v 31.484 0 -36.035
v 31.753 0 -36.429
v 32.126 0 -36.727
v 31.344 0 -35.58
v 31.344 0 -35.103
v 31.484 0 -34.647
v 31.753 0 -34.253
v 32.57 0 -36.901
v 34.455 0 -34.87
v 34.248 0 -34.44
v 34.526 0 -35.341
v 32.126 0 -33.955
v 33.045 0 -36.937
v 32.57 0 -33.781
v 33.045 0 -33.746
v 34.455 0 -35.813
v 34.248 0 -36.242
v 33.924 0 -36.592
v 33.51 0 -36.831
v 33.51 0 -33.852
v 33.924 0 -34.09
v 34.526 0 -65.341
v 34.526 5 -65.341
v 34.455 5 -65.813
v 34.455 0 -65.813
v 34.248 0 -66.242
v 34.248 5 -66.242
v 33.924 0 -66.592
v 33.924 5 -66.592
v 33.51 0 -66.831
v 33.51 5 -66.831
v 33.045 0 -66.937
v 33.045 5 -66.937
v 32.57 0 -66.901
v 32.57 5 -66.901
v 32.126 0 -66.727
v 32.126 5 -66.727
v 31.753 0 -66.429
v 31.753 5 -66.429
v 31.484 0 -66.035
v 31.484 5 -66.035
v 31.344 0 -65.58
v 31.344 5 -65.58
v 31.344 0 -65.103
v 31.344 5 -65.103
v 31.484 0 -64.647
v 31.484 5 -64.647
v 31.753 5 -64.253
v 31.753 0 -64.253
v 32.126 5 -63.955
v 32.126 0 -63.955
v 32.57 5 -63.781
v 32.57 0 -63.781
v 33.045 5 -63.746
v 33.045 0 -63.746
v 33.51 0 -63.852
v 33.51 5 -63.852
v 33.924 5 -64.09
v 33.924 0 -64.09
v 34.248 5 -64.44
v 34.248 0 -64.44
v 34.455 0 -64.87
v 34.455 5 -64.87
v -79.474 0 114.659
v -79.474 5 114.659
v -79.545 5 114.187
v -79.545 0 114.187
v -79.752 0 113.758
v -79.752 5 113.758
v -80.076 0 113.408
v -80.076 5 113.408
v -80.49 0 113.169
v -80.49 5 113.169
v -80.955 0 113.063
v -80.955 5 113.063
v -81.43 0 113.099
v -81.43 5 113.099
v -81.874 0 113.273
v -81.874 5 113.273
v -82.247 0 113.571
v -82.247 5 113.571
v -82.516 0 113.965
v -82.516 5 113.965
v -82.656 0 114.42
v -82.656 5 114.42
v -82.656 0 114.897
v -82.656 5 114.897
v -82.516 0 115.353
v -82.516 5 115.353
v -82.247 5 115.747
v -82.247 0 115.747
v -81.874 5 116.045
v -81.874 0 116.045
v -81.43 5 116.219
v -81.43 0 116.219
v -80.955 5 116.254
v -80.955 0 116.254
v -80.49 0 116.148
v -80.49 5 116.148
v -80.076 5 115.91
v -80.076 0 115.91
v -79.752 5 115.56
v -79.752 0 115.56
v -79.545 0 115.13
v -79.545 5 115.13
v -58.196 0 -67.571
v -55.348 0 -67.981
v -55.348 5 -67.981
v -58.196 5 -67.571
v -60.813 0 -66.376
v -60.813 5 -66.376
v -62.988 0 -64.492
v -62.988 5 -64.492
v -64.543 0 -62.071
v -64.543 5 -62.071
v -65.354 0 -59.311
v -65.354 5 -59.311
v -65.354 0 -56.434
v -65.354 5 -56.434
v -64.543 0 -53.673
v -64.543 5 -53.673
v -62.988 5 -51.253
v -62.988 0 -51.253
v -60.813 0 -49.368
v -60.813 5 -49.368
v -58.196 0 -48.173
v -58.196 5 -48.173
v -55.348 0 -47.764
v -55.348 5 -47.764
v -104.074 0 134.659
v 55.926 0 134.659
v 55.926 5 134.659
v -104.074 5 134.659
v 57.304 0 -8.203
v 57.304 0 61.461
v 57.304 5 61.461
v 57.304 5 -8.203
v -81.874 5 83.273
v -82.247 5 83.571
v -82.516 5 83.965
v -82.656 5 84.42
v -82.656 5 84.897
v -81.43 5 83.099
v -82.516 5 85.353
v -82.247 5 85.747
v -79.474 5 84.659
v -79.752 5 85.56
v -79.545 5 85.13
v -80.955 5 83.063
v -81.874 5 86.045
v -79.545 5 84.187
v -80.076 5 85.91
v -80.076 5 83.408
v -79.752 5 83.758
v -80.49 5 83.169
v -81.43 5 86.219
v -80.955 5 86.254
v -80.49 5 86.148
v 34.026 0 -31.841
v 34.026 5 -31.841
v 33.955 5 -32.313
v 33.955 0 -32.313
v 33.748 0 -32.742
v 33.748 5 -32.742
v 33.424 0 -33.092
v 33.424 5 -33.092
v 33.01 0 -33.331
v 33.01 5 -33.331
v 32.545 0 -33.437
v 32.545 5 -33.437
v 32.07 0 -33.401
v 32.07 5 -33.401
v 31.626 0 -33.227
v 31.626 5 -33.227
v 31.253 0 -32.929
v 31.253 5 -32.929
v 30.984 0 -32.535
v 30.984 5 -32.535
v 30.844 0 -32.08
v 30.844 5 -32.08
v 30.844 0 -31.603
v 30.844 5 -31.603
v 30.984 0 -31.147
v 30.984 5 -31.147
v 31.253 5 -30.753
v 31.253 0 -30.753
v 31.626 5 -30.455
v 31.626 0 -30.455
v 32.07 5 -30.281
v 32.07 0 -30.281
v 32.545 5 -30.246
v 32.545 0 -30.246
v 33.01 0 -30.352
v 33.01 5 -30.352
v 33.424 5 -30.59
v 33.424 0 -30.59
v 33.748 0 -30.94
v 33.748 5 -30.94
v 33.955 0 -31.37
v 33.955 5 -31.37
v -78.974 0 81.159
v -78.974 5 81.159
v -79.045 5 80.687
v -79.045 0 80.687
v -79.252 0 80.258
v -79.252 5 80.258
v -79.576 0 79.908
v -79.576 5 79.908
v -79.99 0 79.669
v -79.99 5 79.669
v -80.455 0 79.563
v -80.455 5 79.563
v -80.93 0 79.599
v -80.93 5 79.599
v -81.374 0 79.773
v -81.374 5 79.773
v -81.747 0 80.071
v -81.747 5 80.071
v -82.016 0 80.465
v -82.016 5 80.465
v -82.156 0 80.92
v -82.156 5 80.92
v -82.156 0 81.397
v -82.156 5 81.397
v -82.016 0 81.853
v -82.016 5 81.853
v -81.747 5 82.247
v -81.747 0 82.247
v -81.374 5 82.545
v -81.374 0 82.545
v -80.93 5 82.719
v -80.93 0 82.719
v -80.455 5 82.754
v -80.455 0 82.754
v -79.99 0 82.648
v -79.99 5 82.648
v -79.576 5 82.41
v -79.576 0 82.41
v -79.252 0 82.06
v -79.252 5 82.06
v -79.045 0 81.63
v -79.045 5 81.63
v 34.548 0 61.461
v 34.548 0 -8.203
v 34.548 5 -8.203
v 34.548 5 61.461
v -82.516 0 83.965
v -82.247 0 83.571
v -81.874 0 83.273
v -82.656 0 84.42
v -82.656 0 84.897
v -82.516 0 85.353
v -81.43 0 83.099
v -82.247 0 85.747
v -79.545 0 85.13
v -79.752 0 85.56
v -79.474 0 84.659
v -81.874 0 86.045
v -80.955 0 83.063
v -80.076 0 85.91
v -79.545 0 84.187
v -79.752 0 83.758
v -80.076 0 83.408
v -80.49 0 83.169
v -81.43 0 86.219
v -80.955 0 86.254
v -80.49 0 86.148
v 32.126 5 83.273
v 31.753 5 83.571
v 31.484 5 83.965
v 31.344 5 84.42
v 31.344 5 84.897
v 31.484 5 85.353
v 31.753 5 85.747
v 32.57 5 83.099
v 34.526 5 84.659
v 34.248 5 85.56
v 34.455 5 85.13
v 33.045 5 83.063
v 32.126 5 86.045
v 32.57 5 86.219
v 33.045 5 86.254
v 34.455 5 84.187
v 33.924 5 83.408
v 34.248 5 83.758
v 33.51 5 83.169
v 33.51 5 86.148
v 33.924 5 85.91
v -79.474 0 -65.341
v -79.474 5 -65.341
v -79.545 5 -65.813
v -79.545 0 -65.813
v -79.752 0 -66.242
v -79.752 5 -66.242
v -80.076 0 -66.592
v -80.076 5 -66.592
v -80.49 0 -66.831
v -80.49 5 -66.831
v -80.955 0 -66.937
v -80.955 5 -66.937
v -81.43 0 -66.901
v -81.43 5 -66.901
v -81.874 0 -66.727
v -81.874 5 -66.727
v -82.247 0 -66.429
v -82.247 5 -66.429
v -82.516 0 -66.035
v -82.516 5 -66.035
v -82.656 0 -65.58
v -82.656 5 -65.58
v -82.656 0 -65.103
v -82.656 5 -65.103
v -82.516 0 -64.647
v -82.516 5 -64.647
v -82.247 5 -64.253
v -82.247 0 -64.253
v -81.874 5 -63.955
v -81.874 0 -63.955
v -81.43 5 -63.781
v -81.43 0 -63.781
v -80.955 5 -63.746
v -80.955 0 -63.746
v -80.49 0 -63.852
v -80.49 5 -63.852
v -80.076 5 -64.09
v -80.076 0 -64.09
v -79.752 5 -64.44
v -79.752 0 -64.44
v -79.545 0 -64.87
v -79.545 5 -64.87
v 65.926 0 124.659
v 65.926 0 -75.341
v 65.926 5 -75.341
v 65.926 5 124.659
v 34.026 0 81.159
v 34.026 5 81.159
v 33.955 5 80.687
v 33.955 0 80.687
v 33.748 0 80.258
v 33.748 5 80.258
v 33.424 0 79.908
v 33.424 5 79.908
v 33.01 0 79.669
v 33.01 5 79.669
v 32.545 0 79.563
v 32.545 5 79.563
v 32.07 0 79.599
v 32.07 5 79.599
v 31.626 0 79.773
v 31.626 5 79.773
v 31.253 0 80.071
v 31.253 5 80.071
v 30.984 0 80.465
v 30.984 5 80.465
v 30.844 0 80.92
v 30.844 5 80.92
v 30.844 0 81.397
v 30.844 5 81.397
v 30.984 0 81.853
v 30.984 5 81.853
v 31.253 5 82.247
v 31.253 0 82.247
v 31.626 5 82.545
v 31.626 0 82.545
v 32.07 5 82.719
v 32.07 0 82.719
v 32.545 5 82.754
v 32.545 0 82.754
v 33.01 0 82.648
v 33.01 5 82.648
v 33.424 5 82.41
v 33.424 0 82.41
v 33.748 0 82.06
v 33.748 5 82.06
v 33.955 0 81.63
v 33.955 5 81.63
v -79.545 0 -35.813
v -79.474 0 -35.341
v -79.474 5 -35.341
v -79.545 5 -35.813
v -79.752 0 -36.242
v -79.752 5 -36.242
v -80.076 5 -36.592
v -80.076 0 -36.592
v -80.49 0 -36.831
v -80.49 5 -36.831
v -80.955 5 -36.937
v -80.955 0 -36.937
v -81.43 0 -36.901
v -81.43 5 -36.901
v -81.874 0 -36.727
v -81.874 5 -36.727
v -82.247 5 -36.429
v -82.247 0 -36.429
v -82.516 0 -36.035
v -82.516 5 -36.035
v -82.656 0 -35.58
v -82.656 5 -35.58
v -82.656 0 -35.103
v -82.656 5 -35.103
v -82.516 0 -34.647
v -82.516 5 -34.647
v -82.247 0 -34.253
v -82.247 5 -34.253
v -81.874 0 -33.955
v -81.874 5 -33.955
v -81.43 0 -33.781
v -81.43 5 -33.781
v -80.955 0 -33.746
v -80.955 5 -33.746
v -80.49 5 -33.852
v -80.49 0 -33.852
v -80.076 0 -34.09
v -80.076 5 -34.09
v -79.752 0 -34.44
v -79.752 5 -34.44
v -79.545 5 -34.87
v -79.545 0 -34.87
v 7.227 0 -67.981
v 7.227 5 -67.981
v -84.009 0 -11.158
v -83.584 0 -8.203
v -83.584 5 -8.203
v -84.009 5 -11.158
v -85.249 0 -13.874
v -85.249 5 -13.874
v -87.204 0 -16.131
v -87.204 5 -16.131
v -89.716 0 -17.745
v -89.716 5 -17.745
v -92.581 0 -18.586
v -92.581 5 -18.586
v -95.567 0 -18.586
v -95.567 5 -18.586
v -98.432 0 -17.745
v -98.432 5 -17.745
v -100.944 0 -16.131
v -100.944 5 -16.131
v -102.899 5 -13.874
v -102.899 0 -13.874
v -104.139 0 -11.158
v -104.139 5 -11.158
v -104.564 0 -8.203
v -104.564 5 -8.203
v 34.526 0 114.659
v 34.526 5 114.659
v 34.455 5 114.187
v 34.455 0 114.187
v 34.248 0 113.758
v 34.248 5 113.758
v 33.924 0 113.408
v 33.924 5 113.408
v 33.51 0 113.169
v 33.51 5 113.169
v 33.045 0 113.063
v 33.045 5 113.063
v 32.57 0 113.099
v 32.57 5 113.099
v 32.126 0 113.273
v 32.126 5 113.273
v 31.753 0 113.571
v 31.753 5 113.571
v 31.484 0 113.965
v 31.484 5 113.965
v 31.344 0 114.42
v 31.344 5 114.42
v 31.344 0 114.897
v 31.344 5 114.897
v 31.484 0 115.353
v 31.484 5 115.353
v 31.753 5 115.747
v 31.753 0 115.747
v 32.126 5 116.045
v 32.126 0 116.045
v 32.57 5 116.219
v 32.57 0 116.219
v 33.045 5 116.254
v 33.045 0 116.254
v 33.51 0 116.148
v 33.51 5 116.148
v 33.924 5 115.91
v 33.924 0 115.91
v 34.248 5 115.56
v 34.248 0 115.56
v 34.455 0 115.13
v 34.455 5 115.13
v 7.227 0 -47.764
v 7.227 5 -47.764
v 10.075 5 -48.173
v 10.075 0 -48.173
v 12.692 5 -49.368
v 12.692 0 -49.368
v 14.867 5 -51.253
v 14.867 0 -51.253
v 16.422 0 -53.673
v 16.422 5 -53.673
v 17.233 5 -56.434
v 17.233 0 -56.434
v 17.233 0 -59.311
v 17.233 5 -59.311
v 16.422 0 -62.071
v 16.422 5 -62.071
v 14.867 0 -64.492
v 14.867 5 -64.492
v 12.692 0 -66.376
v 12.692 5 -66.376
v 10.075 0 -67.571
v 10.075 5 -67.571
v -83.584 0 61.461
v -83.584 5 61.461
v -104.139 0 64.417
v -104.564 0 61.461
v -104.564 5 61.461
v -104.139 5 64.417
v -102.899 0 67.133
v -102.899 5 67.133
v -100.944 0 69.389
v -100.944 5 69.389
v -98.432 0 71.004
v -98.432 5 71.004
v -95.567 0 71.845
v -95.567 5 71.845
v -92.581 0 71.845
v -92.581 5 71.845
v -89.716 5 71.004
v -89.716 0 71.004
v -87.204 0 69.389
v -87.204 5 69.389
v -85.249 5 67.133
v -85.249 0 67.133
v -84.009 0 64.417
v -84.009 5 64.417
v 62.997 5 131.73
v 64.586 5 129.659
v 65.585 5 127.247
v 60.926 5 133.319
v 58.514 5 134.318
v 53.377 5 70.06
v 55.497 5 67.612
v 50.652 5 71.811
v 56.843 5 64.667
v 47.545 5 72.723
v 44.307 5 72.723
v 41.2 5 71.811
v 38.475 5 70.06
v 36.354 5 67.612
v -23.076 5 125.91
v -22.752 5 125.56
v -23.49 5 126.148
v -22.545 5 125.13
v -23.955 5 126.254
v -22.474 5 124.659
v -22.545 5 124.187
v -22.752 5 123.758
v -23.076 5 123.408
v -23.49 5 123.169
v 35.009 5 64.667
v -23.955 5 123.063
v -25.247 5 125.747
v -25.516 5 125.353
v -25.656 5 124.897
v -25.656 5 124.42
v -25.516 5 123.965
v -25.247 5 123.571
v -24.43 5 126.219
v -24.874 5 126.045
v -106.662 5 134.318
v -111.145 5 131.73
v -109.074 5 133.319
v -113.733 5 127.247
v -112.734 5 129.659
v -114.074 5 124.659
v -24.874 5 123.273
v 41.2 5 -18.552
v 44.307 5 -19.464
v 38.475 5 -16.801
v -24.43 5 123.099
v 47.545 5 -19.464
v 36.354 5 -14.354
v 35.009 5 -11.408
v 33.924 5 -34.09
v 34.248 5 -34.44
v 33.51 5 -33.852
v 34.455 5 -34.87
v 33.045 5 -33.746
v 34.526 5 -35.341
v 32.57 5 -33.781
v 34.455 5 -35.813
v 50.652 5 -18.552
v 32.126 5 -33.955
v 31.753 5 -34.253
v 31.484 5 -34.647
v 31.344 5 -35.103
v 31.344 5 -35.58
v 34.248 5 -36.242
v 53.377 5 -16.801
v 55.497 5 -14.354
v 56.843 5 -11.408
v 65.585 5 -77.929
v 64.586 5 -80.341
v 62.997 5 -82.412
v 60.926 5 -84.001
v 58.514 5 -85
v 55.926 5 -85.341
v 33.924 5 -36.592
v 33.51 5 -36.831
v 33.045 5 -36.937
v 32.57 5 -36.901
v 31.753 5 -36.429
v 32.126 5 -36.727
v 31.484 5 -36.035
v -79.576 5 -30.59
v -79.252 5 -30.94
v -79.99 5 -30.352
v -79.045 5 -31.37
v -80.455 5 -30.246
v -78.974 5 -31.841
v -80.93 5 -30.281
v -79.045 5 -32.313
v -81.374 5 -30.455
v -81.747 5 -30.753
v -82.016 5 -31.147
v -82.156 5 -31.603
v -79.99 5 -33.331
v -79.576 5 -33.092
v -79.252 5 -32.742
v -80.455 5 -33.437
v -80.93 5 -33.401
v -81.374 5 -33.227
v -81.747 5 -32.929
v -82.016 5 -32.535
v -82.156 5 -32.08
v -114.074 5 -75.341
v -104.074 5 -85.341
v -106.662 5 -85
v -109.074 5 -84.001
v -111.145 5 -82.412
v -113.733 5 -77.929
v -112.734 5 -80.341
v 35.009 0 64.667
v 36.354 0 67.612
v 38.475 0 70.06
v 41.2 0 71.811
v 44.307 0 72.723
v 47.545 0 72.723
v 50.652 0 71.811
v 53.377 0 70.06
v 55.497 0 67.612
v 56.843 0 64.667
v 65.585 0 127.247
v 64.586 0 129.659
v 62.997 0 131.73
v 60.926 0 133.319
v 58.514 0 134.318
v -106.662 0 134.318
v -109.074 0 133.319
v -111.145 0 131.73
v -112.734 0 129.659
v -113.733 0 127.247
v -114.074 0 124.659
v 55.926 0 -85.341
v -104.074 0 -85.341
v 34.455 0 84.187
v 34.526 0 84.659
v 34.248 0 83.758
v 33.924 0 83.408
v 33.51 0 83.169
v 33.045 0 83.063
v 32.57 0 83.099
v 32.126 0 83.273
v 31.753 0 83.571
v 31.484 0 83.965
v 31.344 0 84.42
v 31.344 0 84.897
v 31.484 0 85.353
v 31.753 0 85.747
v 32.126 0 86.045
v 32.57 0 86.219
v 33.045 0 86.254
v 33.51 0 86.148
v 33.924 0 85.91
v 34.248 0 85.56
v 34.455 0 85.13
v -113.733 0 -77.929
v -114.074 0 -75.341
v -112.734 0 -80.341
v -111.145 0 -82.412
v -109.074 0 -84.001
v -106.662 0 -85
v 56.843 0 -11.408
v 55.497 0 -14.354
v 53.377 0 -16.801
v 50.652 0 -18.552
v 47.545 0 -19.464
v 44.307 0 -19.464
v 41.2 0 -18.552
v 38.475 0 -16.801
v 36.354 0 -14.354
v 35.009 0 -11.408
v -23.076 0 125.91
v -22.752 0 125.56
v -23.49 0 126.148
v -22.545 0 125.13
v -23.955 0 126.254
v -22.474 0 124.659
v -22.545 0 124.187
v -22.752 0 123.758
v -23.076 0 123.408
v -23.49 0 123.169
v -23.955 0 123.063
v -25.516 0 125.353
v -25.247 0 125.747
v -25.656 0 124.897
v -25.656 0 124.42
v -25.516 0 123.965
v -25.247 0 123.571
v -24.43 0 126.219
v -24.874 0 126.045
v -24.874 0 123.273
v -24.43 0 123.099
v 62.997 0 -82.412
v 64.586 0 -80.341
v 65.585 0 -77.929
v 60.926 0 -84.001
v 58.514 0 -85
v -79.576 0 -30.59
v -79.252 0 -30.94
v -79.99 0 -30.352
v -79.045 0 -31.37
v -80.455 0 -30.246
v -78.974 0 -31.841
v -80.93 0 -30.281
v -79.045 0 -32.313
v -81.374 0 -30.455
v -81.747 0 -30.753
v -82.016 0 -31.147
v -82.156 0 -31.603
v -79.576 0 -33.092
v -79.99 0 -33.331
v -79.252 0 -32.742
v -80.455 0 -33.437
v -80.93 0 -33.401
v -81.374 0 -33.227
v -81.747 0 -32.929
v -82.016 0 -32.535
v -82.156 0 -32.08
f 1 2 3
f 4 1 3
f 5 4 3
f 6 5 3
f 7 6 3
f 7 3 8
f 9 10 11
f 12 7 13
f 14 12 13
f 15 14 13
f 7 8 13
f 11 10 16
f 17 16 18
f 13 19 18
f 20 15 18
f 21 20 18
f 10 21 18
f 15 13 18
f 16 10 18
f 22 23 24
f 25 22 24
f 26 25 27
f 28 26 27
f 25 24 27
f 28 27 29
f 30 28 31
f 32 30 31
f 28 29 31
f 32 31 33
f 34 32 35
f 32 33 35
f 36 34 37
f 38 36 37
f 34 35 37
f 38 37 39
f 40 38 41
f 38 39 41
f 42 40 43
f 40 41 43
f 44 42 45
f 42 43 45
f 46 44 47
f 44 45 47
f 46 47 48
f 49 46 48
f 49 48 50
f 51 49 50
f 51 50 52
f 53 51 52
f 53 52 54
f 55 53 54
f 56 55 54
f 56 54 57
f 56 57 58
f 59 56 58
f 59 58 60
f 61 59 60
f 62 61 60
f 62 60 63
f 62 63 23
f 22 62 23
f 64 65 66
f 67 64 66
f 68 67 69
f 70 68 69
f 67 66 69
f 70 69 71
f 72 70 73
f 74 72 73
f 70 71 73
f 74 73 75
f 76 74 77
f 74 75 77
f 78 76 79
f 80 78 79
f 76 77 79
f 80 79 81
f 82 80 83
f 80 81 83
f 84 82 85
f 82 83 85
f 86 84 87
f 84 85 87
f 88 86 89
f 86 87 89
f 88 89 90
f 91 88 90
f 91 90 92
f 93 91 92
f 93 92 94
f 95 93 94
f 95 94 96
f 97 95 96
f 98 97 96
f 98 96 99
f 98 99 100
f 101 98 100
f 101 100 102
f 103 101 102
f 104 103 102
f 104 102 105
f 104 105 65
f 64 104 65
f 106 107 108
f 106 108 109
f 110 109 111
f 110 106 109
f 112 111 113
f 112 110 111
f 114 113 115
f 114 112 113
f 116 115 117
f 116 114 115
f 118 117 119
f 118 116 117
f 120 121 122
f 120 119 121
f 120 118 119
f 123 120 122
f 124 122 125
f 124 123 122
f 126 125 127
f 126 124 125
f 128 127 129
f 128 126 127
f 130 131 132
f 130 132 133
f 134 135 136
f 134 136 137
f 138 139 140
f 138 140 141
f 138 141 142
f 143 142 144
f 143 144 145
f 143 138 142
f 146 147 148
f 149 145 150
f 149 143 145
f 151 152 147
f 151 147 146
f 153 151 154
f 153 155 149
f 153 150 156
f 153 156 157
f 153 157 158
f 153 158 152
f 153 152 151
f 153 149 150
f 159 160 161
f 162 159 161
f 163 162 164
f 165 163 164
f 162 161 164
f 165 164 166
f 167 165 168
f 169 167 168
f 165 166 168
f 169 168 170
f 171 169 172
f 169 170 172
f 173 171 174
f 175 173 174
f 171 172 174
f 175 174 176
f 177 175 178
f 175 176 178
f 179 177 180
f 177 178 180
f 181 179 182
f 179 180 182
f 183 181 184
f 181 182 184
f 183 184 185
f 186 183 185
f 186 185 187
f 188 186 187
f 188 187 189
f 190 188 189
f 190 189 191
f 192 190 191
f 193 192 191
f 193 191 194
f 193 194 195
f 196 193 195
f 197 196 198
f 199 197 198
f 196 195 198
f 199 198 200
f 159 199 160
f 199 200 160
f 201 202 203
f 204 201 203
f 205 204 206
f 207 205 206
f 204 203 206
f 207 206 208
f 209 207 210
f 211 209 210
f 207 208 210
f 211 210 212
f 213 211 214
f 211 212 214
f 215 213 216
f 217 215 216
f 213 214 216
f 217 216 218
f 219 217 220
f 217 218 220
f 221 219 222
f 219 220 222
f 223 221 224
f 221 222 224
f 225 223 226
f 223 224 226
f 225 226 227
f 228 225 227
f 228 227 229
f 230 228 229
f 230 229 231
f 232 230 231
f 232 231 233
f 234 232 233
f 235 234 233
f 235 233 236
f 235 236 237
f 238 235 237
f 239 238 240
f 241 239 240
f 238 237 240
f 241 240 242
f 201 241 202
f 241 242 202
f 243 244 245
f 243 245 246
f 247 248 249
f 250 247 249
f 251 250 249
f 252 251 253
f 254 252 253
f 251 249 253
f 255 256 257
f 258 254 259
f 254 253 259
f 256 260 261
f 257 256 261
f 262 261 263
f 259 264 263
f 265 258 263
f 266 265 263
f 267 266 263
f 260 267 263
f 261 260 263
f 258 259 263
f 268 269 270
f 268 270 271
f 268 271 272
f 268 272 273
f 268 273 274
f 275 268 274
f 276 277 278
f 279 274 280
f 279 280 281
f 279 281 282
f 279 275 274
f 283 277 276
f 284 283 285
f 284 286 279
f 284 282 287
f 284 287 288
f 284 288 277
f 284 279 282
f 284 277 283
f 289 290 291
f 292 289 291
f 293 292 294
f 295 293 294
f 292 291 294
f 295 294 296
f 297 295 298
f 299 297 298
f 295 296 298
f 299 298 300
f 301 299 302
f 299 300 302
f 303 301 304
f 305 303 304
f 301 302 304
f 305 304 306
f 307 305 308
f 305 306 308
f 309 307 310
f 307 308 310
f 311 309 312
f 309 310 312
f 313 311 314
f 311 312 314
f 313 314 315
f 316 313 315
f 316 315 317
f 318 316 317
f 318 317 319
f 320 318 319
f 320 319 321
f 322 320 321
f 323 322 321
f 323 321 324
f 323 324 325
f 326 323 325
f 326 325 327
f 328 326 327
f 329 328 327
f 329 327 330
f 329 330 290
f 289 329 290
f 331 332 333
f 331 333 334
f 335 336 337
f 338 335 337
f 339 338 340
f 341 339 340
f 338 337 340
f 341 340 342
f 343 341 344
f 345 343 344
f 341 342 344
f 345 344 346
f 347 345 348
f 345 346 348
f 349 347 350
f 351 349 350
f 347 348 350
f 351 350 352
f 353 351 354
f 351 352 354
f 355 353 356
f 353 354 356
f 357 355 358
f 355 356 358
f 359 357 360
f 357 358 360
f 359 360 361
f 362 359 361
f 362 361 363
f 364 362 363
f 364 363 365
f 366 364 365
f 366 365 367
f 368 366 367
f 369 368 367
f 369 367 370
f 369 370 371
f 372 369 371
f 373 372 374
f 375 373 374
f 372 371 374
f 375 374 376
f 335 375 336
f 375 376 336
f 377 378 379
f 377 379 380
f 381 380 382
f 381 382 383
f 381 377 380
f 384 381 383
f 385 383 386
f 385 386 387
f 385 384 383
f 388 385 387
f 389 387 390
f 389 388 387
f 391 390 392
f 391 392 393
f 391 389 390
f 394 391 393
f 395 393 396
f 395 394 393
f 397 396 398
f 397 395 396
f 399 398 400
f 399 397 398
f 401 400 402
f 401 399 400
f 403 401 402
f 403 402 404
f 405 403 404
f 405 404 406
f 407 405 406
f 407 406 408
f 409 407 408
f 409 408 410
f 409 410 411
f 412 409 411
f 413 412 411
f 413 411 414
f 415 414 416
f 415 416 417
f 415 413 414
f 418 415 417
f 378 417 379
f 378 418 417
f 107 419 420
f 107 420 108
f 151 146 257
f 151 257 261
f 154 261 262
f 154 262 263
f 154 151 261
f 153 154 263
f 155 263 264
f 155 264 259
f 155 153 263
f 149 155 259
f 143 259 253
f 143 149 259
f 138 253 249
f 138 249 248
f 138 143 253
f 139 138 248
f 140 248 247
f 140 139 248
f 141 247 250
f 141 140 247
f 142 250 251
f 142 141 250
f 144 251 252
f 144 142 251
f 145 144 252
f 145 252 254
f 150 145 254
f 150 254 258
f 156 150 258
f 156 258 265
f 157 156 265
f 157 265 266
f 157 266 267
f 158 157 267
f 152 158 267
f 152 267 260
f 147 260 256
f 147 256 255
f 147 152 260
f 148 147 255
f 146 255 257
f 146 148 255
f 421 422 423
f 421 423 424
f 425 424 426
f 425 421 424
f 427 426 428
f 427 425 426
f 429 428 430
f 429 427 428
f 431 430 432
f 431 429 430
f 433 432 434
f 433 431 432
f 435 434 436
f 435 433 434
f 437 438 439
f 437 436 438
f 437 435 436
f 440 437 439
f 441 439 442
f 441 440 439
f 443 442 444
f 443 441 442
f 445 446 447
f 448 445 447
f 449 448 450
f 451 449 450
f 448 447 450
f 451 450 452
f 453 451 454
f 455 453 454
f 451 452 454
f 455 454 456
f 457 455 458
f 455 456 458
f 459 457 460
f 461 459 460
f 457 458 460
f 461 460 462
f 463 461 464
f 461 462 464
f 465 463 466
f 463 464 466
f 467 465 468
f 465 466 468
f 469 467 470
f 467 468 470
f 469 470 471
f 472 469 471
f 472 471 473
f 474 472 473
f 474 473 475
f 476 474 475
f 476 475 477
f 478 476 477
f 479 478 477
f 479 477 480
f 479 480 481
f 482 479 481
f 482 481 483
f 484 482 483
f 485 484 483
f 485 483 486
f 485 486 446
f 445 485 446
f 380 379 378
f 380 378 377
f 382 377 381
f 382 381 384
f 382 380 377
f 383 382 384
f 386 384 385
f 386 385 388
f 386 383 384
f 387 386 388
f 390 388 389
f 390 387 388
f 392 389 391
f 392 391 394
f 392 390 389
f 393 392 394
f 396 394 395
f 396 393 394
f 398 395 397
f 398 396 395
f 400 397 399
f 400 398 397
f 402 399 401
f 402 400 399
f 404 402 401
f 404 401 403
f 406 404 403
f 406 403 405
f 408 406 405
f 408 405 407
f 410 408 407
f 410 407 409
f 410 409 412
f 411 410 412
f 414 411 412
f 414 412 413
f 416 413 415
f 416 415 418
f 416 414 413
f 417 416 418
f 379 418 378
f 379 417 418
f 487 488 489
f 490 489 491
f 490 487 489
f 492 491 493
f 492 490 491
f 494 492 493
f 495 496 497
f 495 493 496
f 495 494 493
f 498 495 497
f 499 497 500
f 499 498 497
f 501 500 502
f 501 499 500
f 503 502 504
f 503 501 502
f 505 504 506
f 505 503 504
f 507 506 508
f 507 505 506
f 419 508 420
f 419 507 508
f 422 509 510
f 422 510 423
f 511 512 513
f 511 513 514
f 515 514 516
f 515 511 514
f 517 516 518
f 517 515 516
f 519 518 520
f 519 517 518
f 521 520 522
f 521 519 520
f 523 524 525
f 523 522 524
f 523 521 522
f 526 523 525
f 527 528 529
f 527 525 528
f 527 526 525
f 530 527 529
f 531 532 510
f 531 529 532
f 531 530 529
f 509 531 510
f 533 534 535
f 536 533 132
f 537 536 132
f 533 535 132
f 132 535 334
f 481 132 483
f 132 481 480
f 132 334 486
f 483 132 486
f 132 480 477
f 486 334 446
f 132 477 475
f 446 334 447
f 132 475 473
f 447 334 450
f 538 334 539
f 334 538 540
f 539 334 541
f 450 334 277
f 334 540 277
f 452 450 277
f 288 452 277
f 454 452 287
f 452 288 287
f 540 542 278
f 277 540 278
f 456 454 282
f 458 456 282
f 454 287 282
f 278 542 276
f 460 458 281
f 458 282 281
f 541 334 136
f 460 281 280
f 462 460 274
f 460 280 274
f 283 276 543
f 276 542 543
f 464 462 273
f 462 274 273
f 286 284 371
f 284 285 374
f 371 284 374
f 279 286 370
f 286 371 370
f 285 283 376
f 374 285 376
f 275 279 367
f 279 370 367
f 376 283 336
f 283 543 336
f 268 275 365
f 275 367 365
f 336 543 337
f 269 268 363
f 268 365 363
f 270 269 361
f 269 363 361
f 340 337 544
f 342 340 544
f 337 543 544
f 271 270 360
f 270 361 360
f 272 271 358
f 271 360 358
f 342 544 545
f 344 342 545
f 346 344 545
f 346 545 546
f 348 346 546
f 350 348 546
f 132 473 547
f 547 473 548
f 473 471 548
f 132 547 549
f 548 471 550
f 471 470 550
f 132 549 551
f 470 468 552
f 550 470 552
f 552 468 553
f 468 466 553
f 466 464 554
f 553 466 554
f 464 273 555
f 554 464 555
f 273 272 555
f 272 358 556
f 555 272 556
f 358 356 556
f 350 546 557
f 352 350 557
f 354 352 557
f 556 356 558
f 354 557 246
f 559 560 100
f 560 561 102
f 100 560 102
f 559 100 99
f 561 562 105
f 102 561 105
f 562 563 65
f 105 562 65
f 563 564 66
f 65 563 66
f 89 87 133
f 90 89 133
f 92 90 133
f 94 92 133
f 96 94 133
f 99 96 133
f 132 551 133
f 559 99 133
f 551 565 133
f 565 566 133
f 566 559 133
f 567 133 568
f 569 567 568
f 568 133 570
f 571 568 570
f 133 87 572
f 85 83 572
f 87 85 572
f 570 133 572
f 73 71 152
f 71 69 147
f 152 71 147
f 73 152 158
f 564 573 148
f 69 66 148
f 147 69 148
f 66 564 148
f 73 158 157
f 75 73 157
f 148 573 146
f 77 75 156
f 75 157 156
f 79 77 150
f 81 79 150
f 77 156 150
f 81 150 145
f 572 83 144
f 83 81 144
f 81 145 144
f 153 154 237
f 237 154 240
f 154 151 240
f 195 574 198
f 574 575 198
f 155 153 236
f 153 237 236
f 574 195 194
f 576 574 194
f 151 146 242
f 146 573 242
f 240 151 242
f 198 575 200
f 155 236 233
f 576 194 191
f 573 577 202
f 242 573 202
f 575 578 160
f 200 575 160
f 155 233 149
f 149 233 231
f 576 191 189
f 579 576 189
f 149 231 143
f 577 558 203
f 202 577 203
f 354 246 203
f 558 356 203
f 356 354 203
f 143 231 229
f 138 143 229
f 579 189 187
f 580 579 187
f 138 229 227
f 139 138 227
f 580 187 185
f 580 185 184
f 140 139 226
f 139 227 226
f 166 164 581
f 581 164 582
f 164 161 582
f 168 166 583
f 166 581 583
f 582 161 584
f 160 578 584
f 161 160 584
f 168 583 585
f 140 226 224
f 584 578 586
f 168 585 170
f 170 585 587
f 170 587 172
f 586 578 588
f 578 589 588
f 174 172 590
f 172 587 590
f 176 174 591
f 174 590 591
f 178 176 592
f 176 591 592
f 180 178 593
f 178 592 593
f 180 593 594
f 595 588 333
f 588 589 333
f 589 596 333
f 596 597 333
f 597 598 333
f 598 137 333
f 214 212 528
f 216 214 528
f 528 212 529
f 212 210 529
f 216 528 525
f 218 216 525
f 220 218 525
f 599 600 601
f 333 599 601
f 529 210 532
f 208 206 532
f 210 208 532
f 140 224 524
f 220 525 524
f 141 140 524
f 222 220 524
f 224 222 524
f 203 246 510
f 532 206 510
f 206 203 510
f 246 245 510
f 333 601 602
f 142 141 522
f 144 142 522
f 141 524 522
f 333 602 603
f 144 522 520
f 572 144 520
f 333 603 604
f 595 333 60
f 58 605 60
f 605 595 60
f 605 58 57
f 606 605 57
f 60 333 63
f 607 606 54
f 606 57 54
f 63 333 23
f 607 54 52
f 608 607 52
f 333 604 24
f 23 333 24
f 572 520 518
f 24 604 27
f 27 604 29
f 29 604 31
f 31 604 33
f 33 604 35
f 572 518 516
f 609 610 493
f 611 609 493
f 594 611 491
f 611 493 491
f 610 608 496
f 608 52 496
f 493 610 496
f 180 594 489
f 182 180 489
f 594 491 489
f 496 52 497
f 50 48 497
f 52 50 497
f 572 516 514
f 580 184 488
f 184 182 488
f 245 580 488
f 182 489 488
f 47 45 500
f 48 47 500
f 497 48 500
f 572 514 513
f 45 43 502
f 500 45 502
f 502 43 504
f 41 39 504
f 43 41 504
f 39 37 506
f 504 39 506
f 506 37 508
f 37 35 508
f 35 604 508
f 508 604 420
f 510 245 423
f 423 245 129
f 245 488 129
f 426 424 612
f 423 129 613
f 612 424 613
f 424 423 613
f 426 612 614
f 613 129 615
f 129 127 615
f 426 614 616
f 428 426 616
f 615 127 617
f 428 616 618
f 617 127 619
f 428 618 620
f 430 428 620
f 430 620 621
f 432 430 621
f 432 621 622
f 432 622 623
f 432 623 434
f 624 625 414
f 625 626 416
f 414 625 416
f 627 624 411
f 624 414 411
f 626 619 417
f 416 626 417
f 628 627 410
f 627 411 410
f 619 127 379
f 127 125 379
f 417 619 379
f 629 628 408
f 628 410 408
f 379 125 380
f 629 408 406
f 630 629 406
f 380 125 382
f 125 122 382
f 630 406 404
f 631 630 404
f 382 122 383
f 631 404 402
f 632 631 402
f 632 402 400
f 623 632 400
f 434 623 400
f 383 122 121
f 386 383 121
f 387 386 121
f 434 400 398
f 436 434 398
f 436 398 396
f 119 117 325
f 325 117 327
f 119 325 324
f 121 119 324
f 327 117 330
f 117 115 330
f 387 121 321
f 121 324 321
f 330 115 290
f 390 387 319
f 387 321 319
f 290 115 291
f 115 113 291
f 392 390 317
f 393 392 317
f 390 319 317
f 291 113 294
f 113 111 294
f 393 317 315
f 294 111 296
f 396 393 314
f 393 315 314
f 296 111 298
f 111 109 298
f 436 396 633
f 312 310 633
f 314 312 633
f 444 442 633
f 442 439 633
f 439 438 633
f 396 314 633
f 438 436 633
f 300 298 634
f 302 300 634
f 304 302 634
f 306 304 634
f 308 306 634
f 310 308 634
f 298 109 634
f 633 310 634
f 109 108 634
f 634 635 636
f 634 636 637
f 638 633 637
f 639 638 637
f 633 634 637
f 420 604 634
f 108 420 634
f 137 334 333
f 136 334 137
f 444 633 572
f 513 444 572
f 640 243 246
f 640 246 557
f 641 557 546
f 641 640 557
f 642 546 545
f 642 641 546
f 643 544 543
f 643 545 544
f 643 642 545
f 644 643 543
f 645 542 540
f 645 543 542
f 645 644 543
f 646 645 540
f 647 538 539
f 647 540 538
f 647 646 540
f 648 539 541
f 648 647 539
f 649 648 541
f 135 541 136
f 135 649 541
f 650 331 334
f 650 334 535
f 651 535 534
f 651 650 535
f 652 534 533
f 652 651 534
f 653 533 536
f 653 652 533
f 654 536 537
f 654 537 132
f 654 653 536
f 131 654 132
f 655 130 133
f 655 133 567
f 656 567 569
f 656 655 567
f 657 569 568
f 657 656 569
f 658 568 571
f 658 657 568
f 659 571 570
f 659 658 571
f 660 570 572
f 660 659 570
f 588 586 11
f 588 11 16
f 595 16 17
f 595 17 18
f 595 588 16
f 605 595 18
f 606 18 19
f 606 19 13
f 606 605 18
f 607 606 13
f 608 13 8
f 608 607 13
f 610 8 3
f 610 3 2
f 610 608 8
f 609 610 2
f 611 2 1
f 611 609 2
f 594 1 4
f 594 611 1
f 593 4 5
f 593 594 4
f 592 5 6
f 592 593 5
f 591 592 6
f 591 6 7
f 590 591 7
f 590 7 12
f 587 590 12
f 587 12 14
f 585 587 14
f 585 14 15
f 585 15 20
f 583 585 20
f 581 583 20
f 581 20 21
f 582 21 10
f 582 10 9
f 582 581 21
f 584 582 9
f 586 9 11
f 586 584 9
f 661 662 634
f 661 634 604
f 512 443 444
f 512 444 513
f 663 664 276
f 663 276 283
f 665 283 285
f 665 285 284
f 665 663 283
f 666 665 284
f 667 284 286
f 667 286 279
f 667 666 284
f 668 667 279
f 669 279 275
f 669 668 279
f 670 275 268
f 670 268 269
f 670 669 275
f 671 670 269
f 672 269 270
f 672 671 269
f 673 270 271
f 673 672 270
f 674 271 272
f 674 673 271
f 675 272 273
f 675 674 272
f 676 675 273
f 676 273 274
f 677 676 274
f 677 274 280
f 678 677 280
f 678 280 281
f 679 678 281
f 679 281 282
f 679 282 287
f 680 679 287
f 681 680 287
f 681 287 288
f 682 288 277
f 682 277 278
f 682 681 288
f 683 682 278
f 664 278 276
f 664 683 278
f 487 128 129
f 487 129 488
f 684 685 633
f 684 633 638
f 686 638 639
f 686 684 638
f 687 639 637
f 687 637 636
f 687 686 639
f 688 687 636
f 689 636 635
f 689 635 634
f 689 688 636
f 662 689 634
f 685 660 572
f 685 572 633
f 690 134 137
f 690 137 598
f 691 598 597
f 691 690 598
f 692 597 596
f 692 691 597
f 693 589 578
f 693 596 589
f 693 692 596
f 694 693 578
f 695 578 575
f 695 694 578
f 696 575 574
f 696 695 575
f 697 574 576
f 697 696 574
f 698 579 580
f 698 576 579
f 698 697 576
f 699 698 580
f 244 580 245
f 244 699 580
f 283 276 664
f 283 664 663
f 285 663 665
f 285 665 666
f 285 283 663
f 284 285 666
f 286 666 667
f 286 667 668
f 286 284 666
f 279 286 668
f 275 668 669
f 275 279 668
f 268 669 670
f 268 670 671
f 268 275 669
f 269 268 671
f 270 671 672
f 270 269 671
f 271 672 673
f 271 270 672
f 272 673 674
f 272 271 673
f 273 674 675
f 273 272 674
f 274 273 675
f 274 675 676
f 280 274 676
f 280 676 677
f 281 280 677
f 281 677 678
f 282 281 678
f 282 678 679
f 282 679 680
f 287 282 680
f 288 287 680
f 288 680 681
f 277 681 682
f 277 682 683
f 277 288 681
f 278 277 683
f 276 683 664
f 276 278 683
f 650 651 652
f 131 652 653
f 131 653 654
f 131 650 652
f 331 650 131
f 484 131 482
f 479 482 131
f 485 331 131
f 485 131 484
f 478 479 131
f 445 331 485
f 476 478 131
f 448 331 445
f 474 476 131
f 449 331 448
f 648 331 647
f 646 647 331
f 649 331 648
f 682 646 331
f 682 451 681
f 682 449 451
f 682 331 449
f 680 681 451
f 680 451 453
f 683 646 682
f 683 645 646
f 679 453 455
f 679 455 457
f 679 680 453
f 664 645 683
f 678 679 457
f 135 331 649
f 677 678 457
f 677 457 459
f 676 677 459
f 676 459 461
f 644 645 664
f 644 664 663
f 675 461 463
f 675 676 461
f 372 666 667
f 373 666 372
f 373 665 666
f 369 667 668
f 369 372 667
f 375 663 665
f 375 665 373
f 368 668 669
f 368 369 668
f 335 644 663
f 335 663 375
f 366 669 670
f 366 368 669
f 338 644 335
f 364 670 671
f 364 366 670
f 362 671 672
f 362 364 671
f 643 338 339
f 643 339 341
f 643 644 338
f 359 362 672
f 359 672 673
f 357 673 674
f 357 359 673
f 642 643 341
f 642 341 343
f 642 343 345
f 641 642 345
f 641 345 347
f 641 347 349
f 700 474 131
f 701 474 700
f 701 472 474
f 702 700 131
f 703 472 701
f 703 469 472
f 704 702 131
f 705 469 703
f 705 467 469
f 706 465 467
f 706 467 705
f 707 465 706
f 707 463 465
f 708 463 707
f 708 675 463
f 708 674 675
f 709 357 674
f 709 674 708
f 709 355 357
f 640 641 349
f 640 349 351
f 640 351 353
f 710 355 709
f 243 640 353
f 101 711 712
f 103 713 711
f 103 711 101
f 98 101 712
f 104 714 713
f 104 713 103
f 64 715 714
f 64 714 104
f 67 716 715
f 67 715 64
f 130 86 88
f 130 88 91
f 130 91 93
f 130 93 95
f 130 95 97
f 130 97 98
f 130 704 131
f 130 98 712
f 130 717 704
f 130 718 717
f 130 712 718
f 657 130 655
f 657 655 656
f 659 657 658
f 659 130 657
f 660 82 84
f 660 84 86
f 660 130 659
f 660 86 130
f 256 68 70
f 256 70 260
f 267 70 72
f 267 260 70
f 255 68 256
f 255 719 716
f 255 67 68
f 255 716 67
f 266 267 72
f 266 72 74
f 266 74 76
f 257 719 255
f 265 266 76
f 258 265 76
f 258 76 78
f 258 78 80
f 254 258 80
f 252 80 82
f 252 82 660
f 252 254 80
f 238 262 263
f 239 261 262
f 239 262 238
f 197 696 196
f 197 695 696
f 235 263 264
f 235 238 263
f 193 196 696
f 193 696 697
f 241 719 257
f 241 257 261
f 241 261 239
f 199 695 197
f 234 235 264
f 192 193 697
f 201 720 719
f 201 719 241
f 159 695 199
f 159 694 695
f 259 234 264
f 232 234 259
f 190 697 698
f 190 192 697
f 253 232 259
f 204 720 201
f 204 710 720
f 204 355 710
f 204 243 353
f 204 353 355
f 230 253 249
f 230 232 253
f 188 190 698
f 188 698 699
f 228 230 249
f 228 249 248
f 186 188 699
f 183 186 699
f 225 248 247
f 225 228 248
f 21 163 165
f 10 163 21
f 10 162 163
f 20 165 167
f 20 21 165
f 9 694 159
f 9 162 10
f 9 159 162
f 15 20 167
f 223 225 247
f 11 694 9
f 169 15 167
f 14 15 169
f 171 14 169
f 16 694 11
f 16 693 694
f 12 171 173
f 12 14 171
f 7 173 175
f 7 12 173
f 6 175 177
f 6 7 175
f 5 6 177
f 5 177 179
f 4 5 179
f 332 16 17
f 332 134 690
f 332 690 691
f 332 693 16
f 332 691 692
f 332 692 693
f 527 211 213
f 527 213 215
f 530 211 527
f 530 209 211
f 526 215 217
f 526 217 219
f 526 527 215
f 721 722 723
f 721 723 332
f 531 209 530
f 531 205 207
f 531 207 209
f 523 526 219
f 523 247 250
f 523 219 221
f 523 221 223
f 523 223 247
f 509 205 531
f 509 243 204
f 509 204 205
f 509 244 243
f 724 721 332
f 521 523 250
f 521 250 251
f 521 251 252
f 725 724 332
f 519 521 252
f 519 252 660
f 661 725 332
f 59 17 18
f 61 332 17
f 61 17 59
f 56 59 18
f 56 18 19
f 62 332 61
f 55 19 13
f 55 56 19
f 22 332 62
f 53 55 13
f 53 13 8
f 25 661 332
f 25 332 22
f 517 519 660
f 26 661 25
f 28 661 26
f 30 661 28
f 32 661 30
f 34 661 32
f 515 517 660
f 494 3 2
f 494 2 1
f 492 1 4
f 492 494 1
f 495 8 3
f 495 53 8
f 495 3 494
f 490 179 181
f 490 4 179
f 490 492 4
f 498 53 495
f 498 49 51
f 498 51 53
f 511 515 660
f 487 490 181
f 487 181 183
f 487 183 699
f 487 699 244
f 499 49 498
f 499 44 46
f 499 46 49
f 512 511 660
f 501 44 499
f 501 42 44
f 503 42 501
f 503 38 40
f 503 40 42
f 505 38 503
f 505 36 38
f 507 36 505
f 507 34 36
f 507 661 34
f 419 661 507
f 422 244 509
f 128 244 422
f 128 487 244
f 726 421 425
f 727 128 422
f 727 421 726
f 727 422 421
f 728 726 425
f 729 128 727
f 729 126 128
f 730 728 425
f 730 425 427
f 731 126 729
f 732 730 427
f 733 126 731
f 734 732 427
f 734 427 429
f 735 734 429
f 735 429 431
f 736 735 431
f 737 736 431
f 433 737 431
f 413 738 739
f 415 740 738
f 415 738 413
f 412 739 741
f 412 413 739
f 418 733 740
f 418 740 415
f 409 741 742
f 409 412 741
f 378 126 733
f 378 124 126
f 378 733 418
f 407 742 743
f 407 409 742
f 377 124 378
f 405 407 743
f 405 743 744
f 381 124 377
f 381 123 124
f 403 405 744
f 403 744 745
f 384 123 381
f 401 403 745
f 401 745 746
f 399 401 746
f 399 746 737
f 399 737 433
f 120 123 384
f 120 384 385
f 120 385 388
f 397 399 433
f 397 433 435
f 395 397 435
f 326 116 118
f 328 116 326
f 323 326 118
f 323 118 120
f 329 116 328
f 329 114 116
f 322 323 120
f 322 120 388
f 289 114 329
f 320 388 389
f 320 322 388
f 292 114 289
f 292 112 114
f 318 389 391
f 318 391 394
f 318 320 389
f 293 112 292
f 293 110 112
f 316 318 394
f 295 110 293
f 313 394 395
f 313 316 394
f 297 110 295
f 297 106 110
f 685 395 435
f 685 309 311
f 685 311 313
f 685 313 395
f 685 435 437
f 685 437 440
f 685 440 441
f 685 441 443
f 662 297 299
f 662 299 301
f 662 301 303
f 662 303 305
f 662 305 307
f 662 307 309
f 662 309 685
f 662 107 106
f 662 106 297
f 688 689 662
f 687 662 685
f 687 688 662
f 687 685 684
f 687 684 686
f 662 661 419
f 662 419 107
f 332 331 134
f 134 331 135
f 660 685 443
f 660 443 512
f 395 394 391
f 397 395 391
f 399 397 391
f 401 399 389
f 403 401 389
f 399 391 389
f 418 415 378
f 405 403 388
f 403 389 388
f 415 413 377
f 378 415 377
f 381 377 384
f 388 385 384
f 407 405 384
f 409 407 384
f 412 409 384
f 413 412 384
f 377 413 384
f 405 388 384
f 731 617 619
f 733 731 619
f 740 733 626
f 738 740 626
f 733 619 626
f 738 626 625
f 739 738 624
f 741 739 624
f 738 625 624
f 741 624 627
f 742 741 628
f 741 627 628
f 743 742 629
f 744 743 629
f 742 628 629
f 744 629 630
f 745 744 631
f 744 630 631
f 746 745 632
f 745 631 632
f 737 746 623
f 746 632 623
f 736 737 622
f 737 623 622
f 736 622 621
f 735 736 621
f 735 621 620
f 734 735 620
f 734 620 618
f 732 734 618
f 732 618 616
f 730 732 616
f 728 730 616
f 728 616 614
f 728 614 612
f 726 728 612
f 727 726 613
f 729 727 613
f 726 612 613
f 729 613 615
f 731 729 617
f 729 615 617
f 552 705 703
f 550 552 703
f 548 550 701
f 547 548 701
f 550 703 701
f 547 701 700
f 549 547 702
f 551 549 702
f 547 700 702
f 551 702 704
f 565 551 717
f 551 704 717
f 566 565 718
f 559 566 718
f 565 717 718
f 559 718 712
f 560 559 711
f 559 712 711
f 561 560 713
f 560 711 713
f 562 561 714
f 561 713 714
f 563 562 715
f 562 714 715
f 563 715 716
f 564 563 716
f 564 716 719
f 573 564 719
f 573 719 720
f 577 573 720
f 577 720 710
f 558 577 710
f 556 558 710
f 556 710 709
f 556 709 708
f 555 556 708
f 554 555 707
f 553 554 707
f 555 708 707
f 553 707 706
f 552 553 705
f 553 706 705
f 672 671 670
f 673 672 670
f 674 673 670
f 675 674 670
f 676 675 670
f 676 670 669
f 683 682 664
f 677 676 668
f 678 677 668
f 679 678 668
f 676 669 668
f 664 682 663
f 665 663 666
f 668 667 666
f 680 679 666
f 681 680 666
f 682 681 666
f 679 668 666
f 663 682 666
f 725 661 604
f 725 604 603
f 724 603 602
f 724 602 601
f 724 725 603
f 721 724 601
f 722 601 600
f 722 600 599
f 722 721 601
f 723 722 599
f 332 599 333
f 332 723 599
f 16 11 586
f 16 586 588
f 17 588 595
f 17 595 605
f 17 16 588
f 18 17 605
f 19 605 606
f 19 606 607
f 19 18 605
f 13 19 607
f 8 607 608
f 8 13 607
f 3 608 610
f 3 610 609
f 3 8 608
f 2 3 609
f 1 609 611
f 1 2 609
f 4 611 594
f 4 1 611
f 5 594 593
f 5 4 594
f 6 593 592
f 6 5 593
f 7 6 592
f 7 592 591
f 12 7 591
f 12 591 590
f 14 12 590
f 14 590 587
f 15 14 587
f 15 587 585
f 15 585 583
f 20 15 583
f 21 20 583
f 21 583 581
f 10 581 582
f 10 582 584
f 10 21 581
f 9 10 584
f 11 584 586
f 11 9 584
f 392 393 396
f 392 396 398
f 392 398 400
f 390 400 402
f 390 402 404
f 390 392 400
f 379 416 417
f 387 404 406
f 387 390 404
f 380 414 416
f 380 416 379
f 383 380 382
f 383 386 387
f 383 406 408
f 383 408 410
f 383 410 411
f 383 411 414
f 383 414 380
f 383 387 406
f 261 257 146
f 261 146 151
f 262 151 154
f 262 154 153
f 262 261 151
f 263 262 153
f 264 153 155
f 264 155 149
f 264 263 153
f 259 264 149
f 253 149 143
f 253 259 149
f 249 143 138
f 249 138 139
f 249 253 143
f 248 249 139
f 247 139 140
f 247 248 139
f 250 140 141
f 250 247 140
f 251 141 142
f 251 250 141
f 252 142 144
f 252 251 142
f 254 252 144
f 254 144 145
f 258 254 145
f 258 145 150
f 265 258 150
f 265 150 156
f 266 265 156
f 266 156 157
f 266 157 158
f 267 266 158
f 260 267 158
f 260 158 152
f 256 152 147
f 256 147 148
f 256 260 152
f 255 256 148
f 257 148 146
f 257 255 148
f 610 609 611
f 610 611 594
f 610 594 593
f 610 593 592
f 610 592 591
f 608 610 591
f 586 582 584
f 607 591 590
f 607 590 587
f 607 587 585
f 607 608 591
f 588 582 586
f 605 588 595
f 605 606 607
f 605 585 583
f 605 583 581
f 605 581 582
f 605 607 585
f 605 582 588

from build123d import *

# Parameters (mm, degrees)
SKETCH_1_R          = 1.6
EXTRUDE_1_DEPTH     = 5
SKETCH_4_R          = 1.6
CUT_EXTRUDE_2_DEPTH = 10
SKETCH_5_R          = 1.6
EXTRUDE_3_DEPTH     = 5
EXTRUDE_3_2_DEPTH   = 5
EXTRUDE_3_3_DEPTH   = 5
EXTRUDE_3_4_DEPTH   = 5
SKETCH_6_R          = 1.6
CUT_EXTRUDE_3_DEPTH = 5
SKETCH_8_R          = 1.6
CUT_EXTRUDE_4_DEPTH = 5
CUT_EXTRUDE_5_DEPTH = 10


with BuildPart() as part:
    # 草图1 → 凸台-拉伸1 (new body)
    with BuildSketch(Plane(origin=(0, 0, 0), x_dir=(1, 0, 0), z_dir=(0, 1, 0))):
        with BuildLine():
            Line((-104.074074074, 85.341130604), (55.925925926, 85.341130604))
            ThreePointArc((55.925925926, 85.341130604), (62.996993738, 82.412198416), (65.925925926, 75.341130604))
            Line((65.925925926, 75.341130604), (65.925925926, -124.658869396))
            ThreePointArc((65.925925926, -124.658869396), (62.996993738, -131.729937208), (55.925925926, -134.658869396))
            Line((55.925925926, -134.658869396), (-104.074074074, -134.658869396))
            ThreePointArc((-104.074074074, -134.658869396), (-111.145141886, -131.729937208), (-114.074074074, -124.658869396))
            Line((-114.074074074, -124.658869396), (-114.074074074, 75.341130604))
            ThreePointArc((-114.074074074, 75.341130604), (-111.145141886, 82.412198416), (-104.074074074, 85.341130604))
        make_face()
        with Locations((-81.074074074, 35.341130604)):
            Circle(SKETCH_1_R, mode=Mode.SUBTRACT)
        with Locations((32.925925926, 35.341130604)):
            Circle(SKETCH_1_R, mode=Mode.SUBTRACT)
        with Locations((32.925925926, -84.658869396)):
            Circle(SKETCH_1_R, mode=Mode.SUBTRACT)
        with Locations((-81.074074074, -84.658869396)):
            Circle(SKETCH_1_R, mode=Mode.SUBTRACT)
    extrude(amount=EXTRUDE_1_DEPTH)

    # 草图4 → 切除-拉伸2 (cut)
    with BuildSketch(Plane(origin=(0, 5, 0), x_dir=(1, 0, 0), z_dir=(0, 1, 0))):
        with Locations((-81.074074074, 65.341130604)):
            Circle(SKETCH_4_R)
        with Locations((32.925925926, 65.341130604)):
            Circle(SKETCH_4_R)
        with Locations((-81.074074074, -114.658869396)):
            Circle(SKETCH_4_R)
        with Locations((32.925925926, -114.658869396)):
            Circle(SKETCH_4_R)
    extrude(amount=-CUT_EXTRUDE_2_DEPTH, mode=Mode.SUBTRACT)

    # 草图6 → 切除-拉伸3 (cut)
    with BuildSketch(Plane(origin=(0, 5, 0), x_dir=(1, 0, 0), z_dir=(0, 1, 0))):
        with Locations((-80.574074074, -81.158869396)):
            Circle(SKETCH_6_R)
        with Locations((-80.574074074, 31.841130604)):
            Circle(SKETCH_6_R)
        with Locations((32.425925926, 31.841130604)):
            Circle(SKETCH_6_R)
        with Locations((32.425925926, -81.158869396)):
            Circle(SKETCH_6_R)
    extrude(amount=-CUT_EXTRUDE_3_DEPTH, mode=Mode.SUBTRACT)

    # 草图8 → 切除-拉伸4 (cut)
    with BuildSketch(Plane.XZ):
        with Locations((-24.074074074, 124.658869396)):
            Circle(SKETCH_8_R)
    extrude(amount=-CUT_EXTRUDE_4_DEPTH, mode=Mode.SUBTRACT)

    # 草图9 → 切除-拉伸5 (cut)
    with BuildSketch(Plane.XZ):
        with BuildLine():
            Line((-83.583774313, 61.461195306), (-83.583774313, -8.202630081))
            ThreePointArc((-83.583774313, -8.202630081), (-94.074074074, -18.692929841), (-104.564373835, -8.202630081))
            Line((-104.564373835, -8.202630081), (-104.564373835, 61.461195306))
            ThreePointArc((-104.564373835, 61.461195306), (-94.074074074, 71.951495067), (-83.583774313, 61.461195306))
        make_face()
        with BuildLine():
            Line((57.303514341, 61.461195306), (57.303514341, -8.202630081))
            ThreePointArc((57.303514341, -8.202630081), (45.925925926, -19.580218496), (34.54833751, -8.202630081))
            Line((34.54833751, -8.202630081), (34.54833751, 61.461195306))
            ThreePointArc((34.54833751, 61.461195306), (45.925925926, 72.838783721), (57.303514341, 61.461195306))
        make_face()
        with BuildLine():
            Line((-55.348114705, -47.763685582), (7.227090262, -47.763685582))
            ThreePointArc((7.227090262, -47.763685582), (17.335582771, -57.87217809), (7.227090262, -67.980670599))
            Line((7.227090262, -67.980670599), (-55.348114705, -67.980670599))
            ThreePointArc((-55.348114705, -67.980670599), (-65.456607213, -57.87217809), (-55.348114705, -47.763685582))
        make_face()
    extrude(amount=-CUT_EXTRUDE_5_DEPTH, mode=Mode.SUBTRACT)


with BuildPart() as body_2:
    # 草图5 → 凸台-拉伸3 (new body)
    with BuildSketch(Plane(origin=(0, 5, 0), x_dir=(1, 0, 0), z_dir=(0, 1, 0))):
        with Locations((-81.074074074, 35.341130604)):
            Circle(SKETCH_5_R)
    extrude(amount=-EXTRUDE_3_DEPTH)


with BuildPart() as body_3:
    # 草图5 → Extrude 3 2 (new body)
    with BuildSketch(Plane(origin=(0, 5, 0), x_dir=(1, 0, 0), z_dir=(0, 1, 0))):
        with Locations((32.925925926, 35.341130604)):
            Circle(SKETCH_5_R)
    extrude(amount=-EXTRUDE_3_2_DEPTH)


with BuildPart() as body_4:
    # 草图5 → Extrude 3 3 (new body)
    with BuildSketch(Plane(origin=(0, 5, 0), x_dir=(1, 0, 0), z_dir=(0, 1, 0))):
        with Locations((32.925925926, -84.658869396)):
            Circle(SKETCH_5_R)
    extrude(amount=-EXTRUDE_3_3_DEPTH)


with BuildPart() as body_5:
    # 草图5 → Extrude 3 4 (new body)
    with BuildSketch(Plane(origin=(0, 5, 0), x_dir=(1, 0, 0), z_dir=(0, 1, 0))):
        with Locations((-81.074074074, -84.658869396)):
            Circle(SKETCH_5_R)
    extrude(amount=-EXTRUDE_3_4_DEPTH)


solid = Compound([part.part, body_2.part, body_3.part, body_4.part, body_5.part])
